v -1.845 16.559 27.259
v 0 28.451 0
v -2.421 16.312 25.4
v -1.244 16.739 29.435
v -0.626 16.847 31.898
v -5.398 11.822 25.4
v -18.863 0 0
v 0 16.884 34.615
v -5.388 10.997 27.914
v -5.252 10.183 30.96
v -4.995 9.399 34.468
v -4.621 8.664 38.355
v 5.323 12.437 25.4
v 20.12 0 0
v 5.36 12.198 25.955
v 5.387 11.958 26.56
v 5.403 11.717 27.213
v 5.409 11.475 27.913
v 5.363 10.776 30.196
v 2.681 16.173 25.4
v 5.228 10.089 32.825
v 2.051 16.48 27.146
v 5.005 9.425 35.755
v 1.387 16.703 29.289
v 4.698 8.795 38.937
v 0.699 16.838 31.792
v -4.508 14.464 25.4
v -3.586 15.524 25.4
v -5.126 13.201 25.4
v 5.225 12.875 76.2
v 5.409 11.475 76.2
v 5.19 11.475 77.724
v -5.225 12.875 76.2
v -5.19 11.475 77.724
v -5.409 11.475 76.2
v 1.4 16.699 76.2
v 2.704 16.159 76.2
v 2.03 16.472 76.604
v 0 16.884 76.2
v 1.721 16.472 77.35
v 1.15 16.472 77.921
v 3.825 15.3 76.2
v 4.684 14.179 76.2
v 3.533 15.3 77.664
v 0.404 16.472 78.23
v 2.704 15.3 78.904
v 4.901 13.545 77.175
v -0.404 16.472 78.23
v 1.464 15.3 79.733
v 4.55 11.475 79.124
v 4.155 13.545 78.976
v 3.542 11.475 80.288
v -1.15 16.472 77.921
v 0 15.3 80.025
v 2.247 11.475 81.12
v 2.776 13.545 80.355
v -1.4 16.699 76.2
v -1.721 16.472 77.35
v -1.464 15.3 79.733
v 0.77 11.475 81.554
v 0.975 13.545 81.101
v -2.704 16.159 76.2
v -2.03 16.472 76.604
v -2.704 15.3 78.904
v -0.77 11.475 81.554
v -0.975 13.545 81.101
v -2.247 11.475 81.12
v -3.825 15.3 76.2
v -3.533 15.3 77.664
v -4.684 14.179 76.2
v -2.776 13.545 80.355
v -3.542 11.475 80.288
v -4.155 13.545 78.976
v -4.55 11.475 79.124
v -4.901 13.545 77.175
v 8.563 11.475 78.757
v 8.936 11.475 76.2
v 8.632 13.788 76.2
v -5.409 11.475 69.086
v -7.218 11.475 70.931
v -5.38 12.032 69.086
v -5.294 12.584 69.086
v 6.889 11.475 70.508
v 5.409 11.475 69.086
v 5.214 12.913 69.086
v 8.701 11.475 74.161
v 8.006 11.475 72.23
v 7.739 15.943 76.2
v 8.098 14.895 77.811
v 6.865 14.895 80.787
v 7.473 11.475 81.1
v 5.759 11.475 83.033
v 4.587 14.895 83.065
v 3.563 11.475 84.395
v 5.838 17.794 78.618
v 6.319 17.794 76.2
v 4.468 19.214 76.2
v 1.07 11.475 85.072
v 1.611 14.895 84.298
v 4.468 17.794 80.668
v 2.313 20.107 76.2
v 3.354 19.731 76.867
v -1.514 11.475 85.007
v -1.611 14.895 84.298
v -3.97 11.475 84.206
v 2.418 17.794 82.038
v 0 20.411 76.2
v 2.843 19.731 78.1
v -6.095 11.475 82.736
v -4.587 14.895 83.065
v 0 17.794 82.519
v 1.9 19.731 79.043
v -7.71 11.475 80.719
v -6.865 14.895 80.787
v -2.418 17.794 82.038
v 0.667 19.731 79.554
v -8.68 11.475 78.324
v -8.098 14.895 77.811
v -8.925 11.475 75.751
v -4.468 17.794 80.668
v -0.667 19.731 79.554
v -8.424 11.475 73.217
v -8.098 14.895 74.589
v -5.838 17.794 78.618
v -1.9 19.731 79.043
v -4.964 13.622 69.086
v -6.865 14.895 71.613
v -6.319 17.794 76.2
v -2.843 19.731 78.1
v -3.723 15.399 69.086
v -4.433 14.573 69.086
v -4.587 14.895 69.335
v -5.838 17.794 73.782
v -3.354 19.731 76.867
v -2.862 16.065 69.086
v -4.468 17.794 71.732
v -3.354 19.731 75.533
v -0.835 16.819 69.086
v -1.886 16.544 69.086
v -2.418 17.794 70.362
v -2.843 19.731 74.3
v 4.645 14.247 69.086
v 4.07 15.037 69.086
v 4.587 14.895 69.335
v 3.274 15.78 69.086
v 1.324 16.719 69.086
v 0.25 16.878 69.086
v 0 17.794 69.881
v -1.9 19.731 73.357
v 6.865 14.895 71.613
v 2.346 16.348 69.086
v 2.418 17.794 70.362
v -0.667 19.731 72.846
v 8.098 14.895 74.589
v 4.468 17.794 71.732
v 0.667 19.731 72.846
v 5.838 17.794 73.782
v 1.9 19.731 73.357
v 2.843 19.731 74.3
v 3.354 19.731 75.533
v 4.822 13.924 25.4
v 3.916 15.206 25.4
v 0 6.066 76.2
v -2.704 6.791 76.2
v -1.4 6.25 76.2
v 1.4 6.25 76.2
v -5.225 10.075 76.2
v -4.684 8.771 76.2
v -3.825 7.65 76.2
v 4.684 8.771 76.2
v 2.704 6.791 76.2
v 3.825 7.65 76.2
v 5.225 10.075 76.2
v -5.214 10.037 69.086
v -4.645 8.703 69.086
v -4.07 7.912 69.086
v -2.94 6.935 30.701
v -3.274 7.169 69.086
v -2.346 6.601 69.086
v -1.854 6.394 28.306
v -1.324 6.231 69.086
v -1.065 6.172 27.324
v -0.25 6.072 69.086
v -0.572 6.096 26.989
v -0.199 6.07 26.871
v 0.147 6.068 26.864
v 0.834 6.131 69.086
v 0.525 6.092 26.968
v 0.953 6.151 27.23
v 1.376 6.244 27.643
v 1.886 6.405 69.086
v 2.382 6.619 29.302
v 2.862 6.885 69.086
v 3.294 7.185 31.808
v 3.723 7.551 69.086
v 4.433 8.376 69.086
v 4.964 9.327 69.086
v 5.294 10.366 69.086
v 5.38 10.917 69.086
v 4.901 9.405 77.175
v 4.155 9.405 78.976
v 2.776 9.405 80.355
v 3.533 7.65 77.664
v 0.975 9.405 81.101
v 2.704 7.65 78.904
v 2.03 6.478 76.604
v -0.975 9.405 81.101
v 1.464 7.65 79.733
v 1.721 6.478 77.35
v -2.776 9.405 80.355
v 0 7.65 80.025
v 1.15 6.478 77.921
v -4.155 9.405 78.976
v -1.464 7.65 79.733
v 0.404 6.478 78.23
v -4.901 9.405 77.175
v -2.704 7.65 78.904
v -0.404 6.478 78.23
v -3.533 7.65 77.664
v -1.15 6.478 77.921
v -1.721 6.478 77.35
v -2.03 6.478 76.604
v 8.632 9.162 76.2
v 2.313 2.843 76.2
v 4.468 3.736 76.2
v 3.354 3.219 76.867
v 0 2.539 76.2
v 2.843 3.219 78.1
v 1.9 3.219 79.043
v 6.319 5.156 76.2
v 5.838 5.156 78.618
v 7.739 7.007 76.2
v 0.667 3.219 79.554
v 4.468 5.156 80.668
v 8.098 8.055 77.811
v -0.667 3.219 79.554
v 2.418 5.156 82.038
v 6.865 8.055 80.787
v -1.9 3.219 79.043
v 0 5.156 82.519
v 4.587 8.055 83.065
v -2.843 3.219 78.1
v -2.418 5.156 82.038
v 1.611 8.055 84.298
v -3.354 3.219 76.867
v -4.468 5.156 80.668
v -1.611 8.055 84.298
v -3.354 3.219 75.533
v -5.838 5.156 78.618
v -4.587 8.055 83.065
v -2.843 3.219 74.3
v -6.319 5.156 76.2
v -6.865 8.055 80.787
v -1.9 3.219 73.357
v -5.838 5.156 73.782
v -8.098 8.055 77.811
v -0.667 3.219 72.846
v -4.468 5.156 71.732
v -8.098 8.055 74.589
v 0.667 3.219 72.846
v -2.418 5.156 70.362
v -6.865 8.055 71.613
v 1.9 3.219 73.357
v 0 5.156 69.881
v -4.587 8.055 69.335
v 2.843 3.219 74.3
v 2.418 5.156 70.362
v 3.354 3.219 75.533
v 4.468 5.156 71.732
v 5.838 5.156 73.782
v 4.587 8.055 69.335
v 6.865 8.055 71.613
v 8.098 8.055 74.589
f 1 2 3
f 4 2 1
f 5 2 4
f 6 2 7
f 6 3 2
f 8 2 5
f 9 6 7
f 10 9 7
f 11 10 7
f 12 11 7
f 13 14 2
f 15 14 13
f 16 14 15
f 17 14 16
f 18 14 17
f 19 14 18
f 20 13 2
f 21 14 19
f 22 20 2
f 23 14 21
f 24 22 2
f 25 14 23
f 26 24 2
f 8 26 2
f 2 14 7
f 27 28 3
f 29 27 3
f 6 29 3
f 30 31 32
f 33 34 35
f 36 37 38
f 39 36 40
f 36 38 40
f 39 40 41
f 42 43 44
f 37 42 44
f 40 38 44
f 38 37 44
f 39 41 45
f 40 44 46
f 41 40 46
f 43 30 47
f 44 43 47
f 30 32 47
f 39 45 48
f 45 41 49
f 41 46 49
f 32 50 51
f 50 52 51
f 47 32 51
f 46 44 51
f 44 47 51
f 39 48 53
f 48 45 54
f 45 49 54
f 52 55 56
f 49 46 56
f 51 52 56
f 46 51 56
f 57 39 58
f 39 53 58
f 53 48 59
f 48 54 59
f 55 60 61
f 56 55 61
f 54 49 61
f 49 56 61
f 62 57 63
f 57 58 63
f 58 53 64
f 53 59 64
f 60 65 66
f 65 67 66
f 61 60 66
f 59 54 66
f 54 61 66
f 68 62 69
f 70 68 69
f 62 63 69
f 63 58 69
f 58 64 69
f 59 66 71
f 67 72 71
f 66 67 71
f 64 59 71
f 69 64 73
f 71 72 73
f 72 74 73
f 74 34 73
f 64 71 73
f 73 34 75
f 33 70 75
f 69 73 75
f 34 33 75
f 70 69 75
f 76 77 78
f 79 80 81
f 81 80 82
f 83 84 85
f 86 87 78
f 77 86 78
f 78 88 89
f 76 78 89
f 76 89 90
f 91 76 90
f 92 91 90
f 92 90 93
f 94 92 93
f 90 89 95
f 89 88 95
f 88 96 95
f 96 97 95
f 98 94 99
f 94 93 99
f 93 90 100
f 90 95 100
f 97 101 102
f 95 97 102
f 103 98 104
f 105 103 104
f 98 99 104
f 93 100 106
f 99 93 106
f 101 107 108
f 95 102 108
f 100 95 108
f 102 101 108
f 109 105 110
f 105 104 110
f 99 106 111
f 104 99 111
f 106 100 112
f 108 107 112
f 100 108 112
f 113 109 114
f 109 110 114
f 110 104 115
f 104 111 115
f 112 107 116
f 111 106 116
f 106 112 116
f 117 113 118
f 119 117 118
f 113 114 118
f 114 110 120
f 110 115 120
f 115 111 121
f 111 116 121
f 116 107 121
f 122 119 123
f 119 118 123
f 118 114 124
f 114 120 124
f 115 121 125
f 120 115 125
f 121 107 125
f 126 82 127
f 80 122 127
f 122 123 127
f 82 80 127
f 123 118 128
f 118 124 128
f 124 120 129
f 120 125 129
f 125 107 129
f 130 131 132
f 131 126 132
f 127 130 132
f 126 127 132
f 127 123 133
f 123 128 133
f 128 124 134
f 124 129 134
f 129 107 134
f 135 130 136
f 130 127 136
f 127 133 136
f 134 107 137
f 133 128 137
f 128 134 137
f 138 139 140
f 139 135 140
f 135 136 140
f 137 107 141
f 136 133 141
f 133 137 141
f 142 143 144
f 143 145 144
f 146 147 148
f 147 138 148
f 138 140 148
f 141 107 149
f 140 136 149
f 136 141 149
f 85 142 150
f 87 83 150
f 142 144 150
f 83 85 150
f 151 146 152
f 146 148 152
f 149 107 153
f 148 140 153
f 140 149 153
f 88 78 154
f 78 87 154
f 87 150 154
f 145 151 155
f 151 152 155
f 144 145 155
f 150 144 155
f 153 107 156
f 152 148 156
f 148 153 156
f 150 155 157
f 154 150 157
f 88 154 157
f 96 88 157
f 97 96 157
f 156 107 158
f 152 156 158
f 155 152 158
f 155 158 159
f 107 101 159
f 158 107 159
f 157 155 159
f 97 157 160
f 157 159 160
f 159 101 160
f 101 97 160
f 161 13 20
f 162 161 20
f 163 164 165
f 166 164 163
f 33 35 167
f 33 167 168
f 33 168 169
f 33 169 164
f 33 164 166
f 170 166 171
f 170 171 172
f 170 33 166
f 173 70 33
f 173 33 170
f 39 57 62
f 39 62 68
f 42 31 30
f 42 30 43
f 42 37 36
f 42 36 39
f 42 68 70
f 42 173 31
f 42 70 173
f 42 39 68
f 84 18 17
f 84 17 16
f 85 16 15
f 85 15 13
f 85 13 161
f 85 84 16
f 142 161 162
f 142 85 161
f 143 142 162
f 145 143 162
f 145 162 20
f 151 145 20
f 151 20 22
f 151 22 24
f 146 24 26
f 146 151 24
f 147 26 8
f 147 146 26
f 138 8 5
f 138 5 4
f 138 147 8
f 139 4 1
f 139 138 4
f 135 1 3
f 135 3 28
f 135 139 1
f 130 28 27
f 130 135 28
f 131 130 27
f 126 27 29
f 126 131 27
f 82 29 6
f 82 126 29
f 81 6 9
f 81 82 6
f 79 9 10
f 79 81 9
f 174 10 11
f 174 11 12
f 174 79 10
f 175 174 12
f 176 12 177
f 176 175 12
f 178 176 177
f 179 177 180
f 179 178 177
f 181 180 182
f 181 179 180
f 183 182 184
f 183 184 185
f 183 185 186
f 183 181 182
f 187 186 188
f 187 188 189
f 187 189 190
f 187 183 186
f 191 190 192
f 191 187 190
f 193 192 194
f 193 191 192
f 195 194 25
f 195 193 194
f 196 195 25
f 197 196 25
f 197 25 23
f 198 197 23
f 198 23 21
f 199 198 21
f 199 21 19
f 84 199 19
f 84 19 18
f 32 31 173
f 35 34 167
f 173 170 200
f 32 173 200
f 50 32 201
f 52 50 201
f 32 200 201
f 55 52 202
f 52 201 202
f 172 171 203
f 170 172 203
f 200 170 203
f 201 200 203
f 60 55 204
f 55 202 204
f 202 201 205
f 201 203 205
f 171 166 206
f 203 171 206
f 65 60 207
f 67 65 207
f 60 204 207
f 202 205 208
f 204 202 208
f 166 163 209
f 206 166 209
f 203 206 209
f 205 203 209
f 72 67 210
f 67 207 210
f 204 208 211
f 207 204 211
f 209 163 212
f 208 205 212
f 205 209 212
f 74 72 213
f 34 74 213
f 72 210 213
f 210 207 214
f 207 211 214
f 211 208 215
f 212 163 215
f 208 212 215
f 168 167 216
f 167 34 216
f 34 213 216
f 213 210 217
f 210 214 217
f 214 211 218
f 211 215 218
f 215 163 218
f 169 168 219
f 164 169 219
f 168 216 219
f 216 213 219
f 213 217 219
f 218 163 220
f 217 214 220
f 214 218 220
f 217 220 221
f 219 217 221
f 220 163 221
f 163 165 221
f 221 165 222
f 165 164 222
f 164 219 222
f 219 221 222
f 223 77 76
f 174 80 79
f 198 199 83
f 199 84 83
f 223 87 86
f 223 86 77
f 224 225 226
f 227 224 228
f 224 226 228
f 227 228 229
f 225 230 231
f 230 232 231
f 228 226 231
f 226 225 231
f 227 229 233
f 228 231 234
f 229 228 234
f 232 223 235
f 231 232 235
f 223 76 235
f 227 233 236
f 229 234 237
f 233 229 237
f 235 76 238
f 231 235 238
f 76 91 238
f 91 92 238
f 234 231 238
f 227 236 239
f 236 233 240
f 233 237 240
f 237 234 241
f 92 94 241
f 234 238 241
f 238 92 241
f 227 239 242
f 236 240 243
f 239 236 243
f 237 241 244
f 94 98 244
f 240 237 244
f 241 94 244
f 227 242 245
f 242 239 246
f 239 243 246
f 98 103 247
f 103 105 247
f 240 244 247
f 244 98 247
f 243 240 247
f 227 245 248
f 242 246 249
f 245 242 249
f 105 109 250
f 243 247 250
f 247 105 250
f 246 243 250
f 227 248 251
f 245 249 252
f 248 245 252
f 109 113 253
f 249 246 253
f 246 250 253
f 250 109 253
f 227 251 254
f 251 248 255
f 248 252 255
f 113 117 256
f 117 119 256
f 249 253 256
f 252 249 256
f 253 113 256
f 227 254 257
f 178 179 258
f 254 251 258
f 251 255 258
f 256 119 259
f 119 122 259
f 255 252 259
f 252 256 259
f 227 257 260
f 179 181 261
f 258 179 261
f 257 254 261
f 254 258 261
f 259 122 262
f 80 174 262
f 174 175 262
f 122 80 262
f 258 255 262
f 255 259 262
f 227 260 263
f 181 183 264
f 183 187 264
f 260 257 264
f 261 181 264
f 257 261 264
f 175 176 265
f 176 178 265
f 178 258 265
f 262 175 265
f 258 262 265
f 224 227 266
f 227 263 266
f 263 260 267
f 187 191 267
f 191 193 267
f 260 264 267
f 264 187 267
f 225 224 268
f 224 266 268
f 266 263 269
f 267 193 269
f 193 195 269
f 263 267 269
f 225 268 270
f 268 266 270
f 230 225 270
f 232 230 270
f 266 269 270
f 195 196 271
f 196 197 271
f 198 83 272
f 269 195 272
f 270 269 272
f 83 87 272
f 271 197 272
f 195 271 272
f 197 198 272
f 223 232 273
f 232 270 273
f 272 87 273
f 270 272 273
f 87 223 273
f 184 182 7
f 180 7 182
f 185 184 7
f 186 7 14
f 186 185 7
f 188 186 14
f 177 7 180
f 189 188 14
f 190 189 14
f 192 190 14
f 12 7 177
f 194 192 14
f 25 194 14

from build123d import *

# Parameters (mm, degrees)
F2_R          = 5.4088164631
F4_DEPTH      = 25.4
F4_DEPTH_BACK = 25.4


with BuildPart() as f3:
    # F0 (on Top) → F3 section 0
    with BuildSketch(Plane.XY, mode=Mode.PRIVATE) as f3_s0:
        Polygon((20.1203916222, 0), (0, 28.4514948726), (-18.8628677279, 0), align=None)
    loft([f3_s0.sketch, Vertex(0, 11.4749111235, 50.8)])

    # F2 (on offset) → F4 (join, two sides)
    with BuildSketch(Plane.XY.offset(50.8)) as f4_sk:
        with Locations((0, 11.4749111235)):
            Circle(F2_R)
    extrude(amount=F4_DEPTH)
    extrude(f4_sk.sketch, amount=-F4_DEPTH_BACK)

    # F5 (on face) → F6 (revolve)
    with BuildSketch(Plane.XY.offset(76.2)):
        with BuildLine():
            ThreePointArc((0, 2.5385186467), (6.3189837197, 5.1559274038), (8.9363924768, 11.4749111235))
            ThreePointArc((8.9363924768, 11.4749111235), (6.3189837197, 17.7938948432), (0, 20.4113036003))
            Line((0, 20.4113036003), (0, 16.8837275866))
            ThreePointArc((0, 16.8837275866), (3.8246107992, 15.2995219227), (5.4088164631, 11.4749111235))
            ThreePointArc((5.4088164631, 11.4749111235), (3.8246107992, 7.6503003243), (0, 6.0660946605))
            Line((0, 6.0660946605), (0, 2.5385186467))
        make_face()
    revolve(axis=Axis((0, 11.4749111235, 76.2), (0, -1, 0)))


solid = f3.part
